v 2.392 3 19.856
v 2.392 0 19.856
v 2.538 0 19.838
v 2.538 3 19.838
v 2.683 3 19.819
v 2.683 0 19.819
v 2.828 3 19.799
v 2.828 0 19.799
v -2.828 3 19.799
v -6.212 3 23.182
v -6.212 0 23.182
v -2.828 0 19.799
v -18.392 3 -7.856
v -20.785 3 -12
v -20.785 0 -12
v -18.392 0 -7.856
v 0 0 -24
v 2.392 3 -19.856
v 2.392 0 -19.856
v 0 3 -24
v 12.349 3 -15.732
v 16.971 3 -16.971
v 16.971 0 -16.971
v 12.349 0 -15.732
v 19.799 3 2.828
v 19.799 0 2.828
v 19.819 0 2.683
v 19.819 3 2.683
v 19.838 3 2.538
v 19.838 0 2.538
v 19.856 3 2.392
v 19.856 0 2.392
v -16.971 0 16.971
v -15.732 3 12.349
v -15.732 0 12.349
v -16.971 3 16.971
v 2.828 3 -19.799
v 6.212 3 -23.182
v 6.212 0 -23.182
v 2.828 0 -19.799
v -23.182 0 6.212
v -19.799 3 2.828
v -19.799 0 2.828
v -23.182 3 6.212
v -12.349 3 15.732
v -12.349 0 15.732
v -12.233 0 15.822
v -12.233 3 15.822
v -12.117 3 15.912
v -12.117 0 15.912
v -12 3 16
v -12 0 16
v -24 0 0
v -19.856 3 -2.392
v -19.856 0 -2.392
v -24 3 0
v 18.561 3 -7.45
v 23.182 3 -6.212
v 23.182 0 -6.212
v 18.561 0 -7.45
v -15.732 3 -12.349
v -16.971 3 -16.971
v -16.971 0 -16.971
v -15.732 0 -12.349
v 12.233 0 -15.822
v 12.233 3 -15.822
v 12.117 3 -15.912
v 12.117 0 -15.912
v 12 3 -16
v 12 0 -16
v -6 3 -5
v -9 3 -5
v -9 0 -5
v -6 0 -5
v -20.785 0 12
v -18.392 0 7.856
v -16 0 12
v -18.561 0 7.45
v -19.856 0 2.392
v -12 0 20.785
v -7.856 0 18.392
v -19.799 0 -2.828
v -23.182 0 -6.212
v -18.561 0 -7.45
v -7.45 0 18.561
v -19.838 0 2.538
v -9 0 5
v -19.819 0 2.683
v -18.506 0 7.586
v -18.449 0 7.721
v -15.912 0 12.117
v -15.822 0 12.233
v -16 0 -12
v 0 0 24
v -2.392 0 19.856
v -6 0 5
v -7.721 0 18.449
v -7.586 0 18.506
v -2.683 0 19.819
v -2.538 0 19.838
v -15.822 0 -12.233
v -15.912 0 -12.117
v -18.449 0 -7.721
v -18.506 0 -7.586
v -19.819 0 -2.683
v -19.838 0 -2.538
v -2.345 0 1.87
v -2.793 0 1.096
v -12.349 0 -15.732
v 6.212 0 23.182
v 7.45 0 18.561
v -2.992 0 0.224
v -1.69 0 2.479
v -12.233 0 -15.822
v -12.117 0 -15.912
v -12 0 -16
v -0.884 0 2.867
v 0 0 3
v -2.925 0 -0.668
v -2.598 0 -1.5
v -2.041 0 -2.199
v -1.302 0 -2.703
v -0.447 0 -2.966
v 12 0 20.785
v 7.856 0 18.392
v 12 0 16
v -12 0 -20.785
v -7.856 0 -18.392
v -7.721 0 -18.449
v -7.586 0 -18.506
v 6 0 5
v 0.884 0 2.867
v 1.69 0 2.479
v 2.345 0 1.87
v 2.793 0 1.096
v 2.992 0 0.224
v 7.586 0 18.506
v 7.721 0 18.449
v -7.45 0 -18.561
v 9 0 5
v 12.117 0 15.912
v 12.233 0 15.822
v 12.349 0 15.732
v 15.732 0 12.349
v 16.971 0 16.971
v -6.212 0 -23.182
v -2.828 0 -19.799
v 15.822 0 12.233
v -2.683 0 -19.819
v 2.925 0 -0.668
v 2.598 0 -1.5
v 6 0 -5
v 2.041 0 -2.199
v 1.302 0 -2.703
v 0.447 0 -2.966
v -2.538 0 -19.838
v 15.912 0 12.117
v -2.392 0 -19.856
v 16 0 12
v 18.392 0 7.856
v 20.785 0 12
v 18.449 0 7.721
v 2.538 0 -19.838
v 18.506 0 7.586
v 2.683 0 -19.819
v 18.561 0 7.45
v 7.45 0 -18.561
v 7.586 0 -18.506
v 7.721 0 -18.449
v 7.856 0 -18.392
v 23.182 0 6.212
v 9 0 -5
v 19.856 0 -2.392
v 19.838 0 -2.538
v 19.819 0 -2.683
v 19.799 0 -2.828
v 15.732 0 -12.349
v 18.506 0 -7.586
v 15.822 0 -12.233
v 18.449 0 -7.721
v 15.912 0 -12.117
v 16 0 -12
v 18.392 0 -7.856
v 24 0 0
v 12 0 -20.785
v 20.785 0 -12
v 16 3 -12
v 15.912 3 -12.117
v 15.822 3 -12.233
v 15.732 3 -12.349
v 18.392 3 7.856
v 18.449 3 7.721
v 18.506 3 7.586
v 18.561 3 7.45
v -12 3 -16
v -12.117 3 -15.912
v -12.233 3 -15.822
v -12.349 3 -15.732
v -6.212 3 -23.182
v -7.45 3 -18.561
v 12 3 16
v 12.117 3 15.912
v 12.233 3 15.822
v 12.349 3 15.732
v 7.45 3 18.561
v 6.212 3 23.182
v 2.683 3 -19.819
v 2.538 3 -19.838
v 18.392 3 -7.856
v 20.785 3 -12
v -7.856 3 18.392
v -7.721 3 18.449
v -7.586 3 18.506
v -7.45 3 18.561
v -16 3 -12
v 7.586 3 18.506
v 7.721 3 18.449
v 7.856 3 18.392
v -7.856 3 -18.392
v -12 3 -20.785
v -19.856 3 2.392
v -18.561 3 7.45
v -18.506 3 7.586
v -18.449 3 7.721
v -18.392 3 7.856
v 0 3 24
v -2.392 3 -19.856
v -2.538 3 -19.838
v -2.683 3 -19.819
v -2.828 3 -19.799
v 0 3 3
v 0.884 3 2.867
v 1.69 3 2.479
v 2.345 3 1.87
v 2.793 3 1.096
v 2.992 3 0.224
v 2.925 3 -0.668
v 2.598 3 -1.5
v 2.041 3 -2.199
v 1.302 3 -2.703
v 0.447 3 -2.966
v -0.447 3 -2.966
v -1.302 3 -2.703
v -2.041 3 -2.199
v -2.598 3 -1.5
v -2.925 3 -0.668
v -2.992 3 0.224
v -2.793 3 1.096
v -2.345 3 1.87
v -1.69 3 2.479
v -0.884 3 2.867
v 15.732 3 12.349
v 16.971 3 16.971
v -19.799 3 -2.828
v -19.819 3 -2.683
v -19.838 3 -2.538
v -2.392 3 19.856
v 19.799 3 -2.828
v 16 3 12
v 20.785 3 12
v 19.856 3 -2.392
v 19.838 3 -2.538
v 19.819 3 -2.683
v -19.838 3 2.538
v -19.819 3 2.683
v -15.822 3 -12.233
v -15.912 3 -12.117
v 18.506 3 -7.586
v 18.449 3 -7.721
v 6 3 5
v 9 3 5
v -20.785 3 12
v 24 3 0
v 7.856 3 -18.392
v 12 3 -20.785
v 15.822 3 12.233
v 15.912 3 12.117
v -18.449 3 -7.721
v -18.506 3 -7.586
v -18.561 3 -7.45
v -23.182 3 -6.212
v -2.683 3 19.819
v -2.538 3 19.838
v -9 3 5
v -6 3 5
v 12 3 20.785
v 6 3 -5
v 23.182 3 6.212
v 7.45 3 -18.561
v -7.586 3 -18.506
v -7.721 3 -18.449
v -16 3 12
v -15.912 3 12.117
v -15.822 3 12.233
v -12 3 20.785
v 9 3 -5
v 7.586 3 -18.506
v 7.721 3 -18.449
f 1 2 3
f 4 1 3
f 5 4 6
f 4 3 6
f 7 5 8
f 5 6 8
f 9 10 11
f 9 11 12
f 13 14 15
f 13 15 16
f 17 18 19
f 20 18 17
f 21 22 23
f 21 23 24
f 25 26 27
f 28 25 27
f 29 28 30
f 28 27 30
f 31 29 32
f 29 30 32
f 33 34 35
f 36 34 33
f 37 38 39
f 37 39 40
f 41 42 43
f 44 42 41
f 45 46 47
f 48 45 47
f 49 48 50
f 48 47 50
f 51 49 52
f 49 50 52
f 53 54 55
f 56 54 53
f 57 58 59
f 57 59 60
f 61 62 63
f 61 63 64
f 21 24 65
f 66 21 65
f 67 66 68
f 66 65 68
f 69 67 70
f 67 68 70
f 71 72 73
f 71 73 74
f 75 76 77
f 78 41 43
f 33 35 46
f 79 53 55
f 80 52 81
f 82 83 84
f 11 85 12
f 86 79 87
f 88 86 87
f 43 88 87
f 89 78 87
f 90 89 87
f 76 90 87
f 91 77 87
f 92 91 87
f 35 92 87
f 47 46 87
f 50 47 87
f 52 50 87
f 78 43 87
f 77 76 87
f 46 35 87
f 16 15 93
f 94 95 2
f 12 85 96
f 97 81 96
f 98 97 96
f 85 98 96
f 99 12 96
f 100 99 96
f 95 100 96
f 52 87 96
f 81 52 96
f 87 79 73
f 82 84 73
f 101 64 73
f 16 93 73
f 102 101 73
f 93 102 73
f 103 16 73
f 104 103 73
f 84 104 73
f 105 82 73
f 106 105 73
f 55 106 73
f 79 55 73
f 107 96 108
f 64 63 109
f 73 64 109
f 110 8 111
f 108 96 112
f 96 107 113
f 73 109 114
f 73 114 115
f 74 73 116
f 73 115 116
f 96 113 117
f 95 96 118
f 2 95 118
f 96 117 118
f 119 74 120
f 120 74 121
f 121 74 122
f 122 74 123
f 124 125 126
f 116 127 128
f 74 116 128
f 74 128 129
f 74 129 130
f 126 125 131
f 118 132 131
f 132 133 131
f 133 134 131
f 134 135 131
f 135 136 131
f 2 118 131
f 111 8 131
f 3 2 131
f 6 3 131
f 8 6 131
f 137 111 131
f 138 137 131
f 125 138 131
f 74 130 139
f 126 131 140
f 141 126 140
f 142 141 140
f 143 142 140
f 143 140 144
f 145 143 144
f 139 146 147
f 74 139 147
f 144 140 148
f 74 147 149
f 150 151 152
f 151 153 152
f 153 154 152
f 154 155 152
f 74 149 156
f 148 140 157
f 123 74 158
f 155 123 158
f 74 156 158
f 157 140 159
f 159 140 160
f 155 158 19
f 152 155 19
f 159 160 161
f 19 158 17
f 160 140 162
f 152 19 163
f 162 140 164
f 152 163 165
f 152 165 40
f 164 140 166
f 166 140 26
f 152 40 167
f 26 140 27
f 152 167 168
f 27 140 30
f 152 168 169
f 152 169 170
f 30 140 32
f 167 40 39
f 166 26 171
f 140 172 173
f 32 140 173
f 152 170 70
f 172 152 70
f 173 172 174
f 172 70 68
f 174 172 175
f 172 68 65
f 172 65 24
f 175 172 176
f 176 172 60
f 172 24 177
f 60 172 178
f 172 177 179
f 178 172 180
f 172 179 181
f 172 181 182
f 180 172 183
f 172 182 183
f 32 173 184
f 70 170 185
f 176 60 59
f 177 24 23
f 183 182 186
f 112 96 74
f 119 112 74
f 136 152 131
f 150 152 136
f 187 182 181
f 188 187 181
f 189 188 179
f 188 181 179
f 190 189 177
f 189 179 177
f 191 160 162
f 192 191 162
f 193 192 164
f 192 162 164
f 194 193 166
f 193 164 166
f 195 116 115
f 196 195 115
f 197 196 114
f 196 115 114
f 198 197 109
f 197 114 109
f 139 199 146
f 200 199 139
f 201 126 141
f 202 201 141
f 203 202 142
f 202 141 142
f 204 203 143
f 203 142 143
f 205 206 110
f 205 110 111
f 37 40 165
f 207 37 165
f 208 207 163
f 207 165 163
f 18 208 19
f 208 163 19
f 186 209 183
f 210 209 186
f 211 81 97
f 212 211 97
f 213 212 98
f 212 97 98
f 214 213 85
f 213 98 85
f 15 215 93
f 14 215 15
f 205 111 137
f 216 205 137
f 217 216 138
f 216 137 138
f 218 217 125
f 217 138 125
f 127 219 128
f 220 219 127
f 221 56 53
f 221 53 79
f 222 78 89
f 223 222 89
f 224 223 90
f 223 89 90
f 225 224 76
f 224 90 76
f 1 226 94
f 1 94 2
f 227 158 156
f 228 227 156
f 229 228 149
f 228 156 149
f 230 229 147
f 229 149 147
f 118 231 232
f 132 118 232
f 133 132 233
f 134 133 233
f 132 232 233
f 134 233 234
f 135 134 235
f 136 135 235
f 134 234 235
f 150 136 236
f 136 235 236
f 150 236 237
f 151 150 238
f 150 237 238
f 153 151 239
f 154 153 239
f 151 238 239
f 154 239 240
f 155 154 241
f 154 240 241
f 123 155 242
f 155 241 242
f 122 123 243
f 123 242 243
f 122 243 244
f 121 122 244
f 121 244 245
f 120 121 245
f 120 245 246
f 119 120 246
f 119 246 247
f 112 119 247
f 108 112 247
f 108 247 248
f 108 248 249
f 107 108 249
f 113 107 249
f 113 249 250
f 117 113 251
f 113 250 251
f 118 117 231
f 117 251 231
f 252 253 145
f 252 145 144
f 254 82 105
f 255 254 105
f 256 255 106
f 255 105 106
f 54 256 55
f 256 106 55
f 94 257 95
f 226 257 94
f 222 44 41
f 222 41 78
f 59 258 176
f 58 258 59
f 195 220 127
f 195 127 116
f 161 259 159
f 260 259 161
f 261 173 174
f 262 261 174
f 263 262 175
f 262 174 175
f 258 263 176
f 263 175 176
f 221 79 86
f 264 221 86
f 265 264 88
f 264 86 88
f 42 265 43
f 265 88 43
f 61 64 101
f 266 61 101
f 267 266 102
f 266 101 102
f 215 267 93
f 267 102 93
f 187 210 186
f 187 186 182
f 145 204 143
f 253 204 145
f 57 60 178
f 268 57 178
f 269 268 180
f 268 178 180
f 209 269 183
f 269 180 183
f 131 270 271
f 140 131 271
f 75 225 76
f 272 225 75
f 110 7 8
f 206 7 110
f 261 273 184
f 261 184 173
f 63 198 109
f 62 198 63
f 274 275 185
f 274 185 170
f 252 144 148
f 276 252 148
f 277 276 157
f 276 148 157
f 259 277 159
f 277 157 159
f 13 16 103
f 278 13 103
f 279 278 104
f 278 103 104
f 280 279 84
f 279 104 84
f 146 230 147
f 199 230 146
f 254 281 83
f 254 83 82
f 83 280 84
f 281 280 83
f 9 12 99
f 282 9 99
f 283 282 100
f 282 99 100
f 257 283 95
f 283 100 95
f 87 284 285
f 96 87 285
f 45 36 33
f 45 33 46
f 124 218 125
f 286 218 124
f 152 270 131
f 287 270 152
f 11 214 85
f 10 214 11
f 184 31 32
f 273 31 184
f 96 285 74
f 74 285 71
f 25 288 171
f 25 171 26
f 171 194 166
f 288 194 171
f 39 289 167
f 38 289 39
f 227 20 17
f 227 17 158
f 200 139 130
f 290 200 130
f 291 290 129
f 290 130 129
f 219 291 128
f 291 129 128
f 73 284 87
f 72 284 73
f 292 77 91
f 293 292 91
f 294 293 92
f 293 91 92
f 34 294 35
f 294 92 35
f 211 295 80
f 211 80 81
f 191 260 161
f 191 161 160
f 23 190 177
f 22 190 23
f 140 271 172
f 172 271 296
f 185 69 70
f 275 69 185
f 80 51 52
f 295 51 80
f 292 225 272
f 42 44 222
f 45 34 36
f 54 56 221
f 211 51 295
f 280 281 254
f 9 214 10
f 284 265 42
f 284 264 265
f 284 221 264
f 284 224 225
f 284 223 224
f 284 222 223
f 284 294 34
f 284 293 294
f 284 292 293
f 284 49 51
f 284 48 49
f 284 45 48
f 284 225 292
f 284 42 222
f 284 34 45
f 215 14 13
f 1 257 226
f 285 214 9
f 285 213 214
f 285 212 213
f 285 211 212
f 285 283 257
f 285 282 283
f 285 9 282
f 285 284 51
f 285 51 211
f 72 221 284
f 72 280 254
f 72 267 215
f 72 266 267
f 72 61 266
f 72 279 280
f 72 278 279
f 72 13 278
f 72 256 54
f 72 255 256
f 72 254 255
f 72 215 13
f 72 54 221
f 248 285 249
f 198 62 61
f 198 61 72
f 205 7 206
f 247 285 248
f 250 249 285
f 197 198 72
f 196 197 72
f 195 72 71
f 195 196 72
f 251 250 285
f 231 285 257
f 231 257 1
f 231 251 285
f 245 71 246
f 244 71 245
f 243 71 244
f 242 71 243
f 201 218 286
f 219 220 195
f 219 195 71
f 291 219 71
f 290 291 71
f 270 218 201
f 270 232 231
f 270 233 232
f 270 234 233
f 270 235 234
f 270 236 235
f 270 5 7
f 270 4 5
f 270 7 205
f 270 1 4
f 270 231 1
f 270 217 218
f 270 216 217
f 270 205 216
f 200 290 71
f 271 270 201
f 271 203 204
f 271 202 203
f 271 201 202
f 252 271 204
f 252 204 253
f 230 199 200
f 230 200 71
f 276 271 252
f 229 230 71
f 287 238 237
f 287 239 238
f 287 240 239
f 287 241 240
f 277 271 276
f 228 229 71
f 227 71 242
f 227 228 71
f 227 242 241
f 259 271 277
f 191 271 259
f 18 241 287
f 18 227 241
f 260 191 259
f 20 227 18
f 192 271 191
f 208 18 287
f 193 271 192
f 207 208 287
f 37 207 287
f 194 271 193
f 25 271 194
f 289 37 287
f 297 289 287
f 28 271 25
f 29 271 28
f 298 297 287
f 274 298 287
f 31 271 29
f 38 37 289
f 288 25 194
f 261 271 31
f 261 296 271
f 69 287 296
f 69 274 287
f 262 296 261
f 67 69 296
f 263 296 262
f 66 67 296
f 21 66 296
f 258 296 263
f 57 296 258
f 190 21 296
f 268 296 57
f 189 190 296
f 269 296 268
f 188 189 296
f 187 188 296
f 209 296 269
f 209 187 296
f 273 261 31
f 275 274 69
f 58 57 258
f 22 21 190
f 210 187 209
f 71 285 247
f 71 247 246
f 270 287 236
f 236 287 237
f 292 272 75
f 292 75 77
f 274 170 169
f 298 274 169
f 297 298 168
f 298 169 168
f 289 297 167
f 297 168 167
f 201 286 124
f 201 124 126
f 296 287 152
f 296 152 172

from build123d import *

# Parameters (mm, degrees)
SKETCH1_R           = 20
BOSS_EXTRUDE1_DEPTH = 3
BOSS_EXTRUDE2_DEPTH = 3
CIRPATTERN1_COUNT   = 24
SKETCH3_R           = 3
CUT_EXTRUDE1_DEPTH  = 3
SKETCH4_W           = 3
SKETCH4_H           = 10
CUT_EXTRUDE2_DEPTH  = 10


with BuildPart() as part:
    # Sketch1 → Boss-Extrude1 (new body)
    with BuildSketch(Plane(origin=(0, 0, 0), x_dir=(1, 0, 0), z_dir=(0, 1, 0))):
        with Locations(Location((0, 0, 0), (0, 0, 270))):
            Circle(SKETCH1_R)
    extrude(amount=BOSS_EXTRUDE1_DEPTH)

    # Sketch2 → Boss-Extrude2 (add)
    with BuildSketch(Plane(origin=(0, 3, 0), x_dir=(1, 0, 0), z_dir=(0, 1, 0))):
        Polygon((0, 24), (-2.392304845, 19.856406461), (2.392304845, 19.856406461), align=None)
    boss_extrude2 = extrude(amount=-BOSS_EXTRUDE2_DEPTH)

    # CirPattern1: Boss-Extrude2 ×24 about axis
    cirpattern1_axis = Axis((0, 0, 0), (0, 1, 0))
    for i in range(1, CIRPATTERN1_COUNT):
        add(boss_extrude2.rotate(cirpattern1_axis, i * 360 / CIRPATTERN1_COUNT))

    # Sketch3 → Cut-Extrude1 (cut)
    with BuildSketch(Plane(origin=(0, 3, 0), x_dir=(1, 0, 0), z_dir=(0, 1, 0))):
        with Locations(Location((0, 0, 0), (0, 0, 270))):
            Circle(SKETCH3_R)
    extrude(amount=-CUT_EXTRUDE1_DEPTH, mode=Mode.SUBTRACT)

    # Sketch4 → Cut-Extrude2 (cut)
    with BuildSketch(Plane(origin=(0, 3, 0), x_dir=(1, 0, 0), z_dir=(0, 1, 0))):
        with Locations((-7.5, 0)):
            Rectangle(SKETCH4_W, SKETCH4_H)
        with Locations((7.5, 0)):
            Rectangle(SKETCH4_W, SKETCH4_H)
    extrude(amount=-CUT_EXTRUDE2_DEPTH, mode=Mode.SUBTRACT)


solid = part.part
